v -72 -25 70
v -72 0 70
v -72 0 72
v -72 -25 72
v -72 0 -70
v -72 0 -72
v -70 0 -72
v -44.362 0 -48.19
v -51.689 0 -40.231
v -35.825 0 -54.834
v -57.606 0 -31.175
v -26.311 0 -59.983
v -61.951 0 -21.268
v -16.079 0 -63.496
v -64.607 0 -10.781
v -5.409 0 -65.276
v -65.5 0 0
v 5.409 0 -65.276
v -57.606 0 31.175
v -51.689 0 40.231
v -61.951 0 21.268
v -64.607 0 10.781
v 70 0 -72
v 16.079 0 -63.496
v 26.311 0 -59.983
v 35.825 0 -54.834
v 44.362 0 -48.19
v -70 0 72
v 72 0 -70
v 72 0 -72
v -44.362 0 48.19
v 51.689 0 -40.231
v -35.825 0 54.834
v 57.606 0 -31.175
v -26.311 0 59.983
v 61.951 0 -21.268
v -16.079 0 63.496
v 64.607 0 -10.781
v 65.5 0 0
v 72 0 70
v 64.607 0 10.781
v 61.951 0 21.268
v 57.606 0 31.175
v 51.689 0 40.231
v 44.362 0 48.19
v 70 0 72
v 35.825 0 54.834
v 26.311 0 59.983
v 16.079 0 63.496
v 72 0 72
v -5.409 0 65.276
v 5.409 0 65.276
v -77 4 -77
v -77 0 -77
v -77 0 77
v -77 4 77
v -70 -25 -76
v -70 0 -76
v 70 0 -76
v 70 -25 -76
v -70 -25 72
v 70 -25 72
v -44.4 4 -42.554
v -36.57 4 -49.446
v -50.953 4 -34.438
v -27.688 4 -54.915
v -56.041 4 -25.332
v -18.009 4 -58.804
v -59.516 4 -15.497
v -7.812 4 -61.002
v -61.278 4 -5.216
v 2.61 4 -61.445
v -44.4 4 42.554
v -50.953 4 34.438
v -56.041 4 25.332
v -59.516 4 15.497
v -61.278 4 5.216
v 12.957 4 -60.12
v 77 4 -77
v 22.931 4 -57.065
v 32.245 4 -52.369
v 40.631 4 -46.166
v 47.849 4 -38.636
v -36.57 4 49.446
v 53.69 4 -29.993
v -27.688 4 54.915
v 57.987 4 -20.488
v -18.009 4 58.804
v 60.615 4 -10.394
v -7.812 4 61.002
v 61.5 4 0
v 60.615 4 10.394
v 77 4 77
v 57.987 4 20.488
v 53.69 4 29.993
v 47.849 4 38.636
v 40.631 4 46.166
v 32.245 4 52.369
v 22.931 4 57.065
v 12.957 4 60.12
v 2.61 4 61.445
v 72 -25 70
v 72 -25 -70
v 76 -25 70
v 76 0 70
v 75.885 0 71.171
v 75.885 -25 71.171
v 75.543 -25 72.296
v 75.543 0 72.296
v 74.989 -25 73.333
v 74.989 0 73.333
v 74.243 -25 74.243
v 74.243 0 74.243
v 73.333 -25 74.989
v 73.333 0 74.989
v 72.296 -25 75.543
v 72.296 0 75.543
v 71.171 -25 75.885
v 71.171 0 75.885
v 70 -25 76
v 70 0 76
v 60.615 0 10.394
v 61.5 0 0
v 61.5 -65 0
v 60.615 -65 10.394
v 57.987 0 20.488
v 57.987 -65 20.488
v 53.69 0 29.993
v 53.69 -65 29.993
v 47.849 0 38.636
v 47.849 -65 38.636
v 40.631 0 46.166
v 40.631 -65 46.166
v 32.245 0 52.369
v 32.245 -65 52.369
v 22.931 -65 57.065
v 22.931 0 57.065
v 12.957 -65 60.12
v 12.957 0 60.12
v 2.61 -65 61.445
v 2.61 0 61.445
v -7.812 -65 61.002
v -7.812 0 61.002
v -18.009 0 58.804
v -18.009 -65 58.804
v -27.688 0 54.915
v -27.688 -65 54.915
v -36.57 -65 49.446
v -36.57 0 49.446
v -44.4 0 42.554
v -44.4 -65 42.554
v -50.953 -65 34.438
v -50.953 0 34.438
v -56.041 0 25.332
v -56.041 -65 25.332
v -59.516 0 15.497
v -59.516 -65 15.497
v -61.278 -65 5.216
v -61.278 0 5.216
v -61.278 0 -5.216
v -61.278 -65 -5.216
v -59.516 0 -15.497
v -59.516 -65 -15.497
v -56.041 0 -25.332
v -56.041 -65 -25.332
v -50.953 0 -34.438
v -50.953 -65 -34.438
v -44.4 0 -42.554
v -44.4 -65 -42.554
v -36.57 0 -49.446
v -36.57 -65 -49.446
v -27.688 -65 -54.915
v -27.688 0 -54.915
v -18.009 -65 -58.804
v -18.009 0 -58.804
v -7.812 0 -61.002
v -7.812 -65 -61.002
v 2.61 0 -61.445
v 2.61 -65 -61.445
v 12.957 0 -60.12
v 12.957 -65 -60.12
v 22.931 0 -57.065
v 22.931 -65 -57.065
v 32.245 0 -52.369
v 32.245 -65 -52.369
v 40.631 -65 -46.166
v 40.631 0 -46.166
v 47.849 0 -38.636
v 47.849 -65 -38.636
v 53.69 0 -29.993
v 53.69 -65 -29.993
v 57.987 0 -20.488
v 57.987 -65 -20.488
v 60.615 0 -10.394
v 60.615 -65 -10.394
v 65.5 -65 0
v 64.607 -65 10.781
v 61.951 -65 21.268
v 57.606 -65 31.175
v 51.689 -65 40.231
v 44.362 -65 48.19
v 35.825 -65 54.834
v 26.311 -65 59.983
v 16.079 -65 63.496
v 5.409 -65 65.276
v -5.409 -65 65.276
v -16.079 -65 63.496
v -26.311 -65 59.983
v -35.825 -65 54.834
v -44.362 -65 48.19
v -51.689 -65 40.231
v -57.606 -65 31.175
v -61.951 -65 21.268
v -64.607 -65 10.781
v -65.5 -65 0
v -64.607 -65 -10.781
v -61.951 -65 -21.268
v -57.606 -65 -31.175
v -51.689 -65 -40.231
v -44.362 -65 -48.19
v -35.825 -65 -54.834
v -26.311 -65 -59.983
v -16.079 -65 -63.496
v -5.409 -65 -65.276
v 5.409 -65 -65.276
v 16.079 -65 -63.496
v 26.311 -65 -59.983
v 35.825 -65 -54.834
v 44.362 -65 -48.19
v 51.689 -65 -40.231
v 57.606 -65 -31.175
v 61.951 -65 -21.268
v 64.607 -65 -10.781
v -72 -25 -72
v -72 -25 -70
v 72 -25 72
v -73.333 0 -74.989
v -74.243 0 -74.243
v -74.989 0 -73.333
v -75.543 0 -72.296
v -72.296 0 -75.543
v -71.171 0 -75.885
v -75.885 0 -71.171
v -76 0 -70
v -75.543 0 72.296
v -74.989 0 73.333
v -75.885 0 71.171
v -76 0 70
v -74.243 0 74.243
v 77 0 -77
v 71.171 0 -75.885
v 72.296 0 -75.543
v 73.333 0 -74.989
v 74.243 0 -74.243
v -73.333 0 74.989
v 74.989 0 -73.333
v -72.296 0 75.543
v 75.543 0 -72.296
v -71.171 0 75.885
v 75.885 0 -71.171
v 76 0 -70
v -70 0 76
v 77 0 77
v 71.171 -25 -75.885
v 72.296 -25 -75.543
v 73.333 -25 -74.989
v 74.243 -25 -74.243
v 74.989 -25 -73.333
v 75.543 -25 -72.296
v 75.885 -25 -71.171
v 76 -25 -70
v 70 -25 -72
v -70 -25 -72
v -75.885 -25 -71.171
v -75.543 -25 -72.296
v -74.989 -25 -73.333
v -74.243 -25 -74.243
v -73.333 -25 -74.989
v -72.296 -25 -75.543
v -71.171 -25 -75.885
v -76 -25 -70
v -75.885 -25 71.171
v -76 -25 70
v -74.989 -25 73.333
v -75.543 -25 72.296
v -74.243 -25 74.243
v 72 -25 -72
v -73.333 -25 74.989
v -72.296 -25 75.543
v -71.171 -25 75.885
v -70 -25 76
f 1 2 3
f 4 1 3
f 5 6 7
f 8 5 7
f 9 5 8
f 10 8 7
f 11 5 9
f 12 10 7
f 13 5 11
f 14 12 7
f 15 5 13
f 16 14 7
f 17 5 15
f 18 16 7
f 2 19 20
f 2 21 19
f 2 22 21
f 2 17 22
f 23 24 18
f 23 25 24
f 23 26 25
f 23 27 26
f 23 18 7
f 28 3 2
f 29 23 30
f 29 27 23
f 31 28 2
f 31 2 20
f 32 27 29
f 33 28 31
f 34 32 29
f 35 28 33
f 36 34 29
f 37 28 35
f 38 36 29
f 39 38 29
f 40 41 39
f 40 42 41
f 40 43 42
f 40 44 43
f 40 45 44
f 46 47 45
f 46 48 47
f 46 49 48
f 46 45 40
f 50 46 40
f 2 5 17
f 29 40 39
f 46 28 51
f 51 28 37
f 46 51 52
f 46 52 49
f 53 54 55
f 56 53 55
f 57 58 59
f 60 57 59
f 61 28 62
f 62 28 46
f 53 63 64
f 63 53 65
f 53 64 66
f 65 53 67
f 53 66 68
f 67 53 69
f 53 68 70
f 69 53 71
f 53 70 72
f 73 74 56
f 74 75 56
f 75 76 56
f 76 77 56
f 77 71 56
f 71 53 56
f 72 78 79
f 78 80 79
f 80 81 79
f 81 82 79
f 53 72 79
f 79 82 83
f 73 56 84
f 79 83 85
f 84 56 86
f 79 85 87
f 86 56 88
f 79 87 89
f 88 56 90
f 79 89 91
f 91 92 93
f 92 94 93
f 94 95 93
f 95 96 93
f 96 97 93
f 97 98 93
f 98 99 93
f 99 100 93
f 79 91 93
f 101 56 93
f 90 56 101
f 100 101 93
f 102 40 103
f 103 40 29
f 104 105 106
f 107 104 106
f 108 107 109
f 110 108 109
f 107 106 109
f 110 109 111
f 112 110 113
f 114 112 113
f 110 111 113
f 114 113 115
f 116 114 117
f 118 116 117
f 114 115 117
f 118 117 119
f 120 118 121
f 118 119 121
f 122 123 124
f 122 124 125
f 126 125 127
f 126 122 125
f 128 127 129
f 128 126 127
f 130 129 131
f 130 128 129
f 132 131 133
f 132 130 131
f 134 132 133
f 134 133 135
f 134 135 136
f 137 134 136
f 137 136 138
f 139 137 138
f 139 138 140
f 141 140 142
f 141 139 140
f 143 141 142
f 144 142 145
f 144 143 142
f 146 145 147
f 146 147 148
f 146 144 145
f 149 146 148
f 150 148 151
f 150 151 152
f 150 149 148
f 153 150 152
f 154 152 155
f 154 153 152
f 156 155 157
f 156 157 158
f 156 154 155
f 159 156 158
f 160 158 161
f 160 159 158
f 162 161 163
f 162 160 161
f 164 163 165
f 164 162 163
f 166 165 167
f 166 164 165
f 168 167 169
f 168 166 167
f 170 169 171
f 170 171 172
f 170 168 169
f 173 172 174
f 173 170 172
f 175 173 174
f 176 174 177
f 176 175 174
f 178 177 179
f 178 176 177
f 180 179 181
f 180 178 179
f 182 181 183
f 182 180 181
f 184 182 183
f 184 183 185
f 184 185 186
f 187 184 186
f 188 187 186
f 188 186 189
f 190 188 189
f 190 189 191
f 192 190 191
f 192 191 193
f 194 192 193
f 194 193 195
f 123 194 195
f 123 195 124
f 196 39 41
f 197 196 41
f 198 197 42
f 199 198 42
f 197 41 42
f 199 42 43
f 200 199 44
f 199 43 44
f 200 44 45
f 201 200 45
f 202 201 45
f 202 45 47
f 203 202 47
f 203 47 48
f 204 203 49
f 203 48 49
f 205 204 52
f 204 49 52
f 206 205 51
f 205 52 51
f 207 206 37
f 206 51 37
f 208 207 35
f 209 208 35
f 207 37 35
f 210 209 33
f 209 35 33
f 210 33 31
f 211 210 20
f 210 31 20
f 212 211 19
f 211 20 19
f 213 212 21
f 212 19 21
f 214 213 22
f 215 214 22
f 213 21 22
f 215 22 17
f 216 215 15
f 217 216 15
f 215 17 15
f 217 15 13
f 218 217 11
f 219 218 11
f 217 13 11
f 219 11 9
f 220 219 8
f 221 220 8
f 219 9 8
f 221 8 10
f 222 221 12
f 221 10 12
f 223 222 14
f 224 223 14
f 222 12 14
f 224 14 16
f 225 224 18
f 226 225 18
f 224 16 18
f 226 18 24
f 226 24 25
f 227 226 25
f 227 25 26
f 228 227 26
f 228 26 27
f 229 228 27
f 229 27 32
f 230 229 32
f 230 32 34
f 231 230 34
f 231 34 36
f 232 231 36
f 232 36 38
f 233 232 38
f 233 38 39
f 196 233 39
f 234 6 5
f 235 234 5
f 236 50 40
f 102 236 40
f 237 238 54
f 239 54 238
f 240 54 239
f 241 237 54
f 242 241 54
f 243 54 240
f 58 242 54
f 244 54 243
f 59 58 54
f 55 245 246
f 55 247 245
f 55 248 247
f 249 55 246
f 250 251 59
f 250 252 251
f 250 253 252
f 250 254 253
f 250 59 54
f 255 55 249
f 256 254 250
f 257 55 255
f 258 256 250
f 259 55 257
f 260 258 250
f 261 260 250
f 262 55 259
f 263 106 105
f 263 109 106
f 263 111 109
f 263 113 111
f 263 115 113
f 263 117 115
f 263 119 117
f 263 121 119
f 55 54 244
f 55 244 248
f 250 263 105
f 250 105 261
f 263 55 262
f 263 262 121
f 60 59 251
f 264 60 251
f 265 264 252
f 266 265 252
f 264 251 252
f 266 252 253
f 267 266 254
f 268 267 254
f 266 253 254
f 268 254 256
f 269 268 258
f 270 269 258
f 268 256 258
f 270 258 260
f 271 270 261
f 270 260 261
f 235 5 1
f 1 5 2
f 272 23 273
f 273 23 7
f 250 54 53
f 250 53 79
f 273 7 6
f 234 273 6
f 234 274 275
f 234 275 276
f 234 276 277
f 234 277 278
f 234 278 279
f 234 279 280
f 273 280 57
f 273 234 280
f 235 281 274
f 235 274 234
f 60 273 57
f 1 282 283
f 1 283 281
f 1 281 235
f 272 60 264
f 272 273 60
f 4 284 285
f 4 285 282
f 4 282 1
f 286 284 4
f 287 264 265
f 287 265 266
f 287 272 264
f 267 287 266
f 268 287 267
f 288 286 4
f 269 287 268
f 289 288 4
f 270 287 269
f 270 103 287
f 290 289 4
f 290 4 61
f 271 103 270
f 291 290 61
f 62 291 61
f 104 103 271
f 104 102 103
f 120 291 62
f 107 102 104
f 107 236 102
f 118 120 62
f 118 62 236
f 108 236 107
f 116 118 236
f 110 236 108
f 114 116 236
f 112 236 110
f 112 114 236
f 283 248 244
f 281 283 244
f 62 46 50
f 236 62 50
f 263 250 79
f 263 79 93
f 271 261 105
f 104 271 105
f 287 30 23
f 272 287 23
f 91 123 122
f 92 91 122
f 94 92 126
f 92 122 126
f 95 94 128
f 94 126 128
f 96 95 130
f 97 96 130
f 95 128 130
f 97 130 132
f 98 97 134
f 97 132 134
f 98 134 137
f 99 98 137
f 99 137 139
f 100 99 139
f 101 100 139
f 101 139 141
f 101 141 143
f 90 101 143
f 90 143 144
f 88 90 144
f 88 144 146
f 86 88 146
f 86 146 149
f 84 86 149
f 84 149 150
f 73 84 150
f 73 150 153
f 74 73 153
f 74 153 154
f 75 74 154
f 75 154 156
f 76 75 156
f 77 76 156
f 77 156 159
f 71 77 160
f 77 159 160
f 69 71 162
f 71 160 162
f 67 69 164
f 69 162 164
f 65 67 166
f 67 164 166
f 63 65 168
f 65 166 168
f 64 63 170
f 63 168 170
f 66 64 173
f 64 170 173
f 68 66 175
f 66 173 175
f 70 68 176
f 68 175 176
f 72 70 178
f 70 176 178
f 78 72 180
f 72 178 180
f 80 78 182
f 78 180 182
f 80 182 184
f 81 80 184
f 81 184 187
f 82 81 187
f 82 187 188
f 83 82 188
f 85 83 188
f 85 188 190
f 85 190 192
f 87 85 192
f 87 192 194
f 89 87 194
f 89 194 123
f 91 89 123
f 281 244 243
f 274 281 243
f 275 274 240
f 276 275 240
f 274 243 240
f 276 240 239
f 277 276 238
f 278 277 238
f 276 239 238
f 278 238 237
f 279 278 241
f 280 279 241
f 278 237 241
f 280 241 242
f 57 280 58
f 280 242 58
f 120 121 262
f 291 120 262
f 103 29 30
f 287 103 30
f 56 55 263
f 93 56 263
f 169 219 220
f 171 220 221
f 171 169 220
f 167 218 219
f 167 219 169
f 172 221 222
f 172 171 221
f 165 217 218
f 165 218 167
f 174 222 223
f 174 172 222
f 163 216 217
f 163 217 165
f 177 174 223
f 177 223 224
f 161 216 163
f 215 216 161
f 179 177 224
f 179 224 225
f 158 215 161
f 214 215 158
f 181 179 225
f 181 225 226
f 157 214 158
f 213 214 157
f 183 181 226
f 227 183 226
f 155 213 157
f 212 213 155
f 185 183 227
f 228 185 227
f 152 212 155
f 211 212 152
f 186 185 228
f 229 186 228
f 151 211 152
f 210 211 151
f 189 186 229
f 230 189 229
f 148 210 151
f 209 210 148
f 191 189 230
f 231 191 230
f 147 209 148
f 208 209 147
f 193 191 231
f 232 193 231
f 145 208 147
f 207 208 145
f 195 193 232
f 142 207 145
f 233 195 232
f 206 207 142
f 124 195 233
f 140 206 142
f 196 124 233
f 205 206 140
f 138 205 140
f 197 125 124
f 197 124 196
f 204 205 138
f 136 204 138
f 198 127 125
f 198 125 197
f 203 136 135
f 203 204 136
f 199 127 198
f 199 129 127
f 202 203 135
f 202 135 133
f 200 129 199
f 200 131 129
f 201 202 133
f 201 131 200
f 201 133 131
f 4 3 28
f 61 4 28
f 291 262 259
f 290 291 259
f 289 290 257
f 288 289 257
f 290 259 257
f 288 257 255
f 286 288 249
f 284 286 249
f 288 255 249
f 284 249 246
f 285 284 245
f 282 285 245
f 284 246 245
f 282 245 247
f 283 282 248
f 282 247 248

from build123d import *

# Parameters (mm, degrees)
F0_W     = 154
F0_H     = 154
F1_DEPTH = 4
F3_DEPTH = 25
F4_R     = 65.5
F4_R_2   = 61.5
F5_DEPTH = 65
F6_DEPTH = 88.2


# Not quite as in the source:
# - ends of sketch curves that miss each other by under 0.0002 mm in the source are joined


with BuildPart() as f1:
    # F0 (on Front) → F1 (new body)
    with BuildSketch(Plane.XZ):
        Rectangle(F0_W, F0_H)
    extrude(amount=-F1_DEPTH)

    # F2 (on face) → F3 (join)
    with BuildSketch(Plane.XZ):
        with BuildLine():
            ThreePointArc((-76, -70), (-74.2426406871, -74.2426406871), (-70, -76))
            Line((-70, -76), (70, -76))
            ThreePointArc((70, -76), (74.2426406871, -74.2426406871), (76, -70))
            Line((76, -70), (76, 70))
            ThreePointArc((76, 70), (74.2426406871, 74.2426406871), (70, 76))
            Line((70, 76), (-70, 76))
            ThreePointArc((-70, 76), (-74.2426406871, 74.2426406871), (-76, 70))
            Line((-76, 70), (-76, -70))
        make_face()
        Polygon((-71.9999969006, 71.9999969006), (-70, 71.9999969006), (70, 72), (71.9999969006, 71.9999969006), (71.9999969006, 70), (72, -70), (71.9999969006, -71.9999969006), (70, -71.9999969006), (-70, -72), (-71.9999969006, -71.9999969006), (-71.9999969006, -70), (-72, 70), align=None, mode=Mode.SUBTRACT)
    extrude(amount=F3_DEPTH)

    # F4 (on face) → F5 (join)
    with BuildSketch(Plane.XZ):
        Circle(F4_R)
        Circle(F4_R_2, mode=Mode.SUBTRACT)
    extrude(amount=F5_DEPTH)

    # F6 (cut): a face of the model
    f6_faces = [f1.faces().sort_by_distance(p)[0] for p in [
        (0, 0, 0),
    ]]
    extrude(f6_faces, amount=-F6_DEPTH, mode=Mode.SUBTRACT)


solid = f1.part
